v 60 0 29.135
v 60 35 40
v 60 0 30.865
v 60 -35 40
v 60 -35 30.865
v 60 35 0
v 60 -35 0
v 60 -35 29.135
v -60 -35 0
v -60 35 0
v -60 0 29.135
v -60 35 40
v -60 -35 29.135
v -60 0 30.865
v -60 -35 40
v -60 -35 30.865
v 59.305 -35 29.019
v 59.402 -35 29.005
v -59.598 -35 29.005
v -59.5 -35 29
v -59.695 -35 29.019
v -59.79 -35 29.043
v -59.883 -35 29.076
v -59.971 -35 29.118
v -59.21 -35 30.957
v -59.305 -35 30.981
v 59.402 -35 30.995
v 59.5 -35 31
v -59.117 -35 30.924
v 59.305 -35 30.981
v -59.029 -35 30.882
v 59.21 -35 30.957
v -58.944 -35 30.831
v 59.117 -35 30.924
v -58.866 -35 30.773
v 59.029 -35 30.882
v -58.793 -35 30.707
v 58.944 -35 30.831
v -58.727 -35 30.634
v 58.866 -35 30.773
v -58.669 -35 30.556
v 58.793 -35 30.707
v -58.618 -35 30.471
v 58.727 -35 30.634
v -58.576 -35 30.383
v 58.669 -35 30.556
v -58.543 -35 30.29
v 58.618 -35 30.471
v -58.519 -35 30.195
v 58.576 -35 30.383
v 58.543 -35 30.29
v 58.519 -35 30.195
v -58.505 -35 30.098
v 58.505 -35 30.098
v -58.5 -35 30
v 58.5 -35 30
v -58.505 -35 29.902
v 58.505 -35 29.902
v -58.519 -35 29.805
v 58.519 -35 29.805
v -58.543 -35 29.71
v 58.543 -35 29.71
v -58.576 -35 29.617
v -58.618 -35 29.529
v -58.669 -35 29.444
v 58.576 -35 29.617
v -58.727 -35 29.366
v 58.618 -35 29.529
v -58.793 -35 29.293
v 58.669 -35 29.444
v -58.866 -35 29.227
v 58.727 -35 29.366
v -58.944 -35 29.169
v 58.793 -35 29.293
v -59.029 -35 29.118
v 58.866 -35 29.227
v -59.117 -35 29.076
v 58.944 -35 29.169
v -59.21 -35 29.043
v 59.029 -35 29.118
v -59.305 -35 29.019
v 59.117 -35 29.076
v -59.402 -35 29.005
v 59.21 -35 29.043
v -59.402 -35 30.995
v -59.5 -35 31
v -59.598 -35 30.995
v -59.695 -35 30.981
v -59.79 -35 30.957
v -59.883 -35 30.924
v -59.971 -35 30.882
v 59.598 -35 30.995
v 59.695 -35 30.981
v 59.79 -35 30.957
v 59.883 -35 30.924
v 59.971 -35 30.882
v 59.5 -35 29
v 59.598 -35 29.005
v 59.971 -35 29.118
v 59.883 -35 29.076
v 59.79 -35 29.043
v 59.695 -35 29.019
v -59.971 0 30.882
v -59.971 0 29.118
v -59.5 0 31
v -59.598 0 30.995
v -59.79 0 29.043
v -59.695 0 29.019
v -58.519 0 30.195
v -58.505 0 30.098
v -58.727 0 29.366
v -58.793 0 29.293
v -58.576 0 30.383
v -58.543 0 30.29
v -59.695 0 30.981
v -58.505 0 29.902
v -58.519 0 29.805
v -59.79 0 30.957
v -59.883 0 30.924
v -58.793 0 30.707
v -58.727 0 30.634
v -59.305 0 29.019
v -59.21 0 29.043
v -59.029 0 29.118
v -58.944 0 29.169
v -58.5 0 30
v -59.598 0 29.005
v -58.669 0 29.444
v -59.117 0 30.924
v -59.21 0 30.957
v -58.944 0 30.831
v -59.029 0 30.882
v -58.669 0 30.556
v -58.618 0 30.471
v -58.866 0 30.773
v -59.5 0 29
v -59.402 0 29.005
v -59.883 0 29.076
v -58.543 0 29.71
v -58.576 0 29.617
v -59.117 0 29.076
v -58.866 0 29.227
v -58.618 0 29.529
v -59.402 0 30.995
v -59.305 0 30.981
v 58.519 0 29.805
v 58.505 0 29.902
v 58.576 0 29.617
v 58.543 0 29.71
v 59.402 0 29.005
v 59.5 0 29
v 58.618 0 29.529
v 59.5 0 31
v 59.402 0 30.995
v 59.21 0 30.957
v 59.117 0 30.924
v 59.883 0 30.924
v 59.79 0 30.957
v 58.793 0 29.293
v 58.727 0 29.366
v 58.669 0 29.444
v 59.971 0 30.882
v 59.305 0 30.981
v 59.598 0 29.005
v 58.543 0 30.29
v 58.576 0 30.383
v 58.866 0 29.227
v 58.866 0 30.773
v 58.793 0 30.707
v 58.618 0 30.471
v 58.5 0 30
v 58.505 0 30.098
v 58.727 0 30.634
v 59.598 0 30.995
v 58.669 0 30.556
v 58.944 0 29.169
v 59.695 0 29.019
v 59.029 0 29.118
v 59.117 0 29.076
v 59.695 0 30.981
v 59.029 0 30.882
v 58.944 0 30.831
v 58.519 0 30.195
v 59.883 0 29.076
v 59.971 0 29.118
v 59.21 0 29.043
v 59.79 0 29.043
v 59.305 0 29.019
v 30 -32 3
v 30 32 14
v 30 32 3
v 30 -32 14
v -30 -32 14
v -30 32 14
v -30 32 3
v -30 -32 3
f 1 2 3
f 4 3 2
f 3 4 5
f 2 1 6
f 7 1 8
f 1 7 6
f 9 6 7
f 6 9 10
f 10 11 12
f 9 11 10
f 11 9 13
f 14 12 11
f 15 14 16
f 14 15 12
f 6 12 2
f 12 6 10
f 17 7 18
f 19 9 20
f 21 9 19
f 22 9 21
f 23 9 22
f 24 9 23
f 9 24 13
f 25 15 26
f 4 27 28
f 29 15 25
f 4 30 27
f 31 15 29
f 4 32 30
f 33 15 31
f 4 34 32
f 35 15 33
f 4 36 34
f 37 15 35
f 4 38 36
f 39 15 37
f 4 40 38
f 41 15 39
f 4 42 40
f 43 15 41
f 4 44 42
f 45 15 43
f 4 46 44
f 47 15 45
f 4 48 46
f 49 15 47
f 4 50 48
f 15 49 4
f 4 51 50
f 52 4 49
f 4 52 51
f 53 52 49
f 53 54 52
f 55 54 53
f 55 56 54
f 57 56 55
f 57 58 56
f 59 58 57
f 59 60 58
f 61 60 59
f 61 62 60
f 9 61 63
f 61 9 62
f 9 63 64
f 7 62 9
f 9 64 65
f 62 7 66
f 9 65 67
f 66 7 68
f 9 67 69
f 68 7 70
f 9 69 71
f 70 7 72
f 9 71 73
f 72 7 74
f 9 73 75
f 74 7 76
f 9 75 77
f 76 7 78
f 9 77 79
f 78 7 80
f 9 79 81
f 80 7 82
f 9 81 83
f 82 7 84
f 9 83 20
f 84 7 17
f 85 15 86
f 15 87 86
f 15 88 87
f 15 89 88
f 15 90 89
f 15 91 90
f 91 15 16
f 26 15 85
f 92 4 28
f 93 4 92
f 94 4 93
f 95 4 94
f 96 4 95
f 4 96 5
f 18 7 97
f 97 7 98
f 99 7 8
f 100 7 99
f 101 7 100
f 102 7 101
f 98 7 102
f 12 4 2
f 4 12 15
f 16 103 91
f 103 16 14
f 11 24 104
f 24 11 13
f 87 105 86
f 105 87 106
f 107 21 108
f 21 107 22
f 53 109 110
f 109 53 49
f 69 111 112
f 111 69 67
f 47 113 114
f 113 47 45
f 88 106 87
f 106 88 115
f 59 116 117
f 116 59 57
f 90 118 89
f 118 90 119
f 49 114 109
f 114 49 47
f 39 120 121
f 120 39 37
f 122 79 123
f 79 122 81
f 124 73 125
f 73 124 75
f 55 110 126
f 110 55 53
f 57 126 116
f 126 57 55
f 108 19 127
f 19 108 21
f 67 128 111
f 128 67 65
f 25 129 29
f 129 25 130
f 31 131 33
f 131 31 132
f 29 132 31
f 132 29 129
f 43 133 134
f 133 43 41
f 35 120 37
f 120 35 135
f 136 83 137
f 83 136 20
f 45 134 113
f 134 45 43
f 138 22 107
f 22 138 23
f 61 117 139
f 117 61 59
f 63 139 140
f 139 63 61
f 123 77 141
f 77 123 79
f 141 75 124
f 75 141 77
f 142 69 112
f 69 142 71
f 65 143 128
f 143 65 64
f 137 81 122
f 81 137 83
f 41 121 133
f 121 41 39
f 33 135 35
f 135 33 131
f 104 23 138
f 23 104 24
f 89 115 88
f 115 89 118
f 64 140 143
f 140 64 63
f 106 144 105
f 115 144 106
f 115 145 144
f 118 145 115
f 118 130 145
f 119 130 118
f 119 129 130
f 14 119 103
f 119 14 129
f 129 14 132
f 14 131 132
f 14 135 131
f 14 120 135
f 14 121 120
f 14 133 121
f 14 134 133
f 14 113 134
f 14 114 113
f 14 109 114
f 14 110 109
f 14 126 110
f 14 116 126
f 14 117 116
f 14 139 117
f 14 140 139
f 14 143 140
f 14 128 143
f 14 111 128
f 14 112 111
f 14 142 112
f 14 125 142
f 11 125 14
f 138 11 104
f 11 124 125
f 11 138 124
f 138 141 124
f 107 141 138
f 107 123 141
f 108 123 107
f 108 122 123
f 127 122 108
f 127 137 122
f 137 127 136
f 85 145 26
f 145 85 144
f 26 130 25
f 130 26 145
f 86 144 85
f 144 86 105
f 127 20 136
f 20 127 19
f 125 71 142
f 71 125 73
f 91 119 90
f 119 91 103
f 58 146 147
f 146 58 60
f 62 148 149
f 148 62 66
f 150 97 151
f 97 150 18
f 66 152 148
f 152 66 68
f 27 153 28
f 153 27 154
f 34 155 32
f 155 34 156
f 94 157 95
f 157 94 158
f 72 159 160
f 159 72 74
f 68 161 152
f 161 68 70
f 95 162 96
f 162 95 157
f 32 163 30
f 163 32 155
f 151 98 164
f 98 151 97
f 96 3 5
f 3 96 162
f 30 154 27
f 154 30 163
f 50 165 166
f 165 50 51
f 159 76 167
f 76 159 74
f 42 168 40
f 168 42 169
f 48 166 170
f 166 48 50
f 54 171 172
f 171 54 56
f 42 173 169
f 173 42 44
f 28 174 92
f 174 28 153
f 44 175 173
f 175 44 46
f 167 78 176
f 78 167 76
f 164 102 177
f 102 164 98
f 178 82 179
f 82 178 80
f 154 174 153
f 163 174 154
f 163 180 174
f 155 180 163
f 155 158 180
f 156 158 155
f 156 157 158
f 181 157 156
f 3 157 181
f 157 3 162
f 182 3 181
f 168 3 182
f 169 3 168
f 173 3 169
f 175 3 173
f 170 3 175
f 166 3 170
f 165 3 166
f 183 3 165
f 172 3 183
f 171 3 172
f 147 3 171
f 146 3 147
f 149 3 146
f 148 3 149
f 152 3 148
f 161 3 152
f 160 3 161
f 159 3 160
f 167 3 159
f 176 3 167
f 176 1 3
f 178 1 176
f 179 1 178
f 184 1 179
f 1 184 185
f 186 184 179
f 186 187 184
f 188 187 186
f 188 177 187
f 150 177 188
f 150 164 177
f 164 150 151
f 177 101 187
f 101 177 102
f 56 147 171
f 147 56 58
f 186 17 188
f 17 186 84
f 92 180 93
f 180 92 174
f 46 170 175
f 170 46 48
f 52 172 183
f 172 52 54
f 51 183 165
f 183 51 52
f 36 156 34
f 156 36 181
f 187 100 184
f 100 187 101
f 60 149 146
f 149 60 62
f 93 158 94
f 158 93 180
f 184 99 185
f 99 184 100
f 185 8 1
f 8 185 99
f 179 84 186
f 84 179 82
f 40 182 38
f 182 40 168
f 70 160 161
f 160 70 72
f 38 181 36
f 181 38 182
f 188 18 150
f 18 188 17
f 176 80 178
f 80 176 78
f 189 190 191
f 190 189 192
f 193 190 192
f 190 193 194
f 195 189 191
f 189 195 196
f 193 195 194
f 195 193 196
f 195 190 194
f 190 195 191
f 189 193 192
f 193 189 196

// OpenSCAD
// Mini horizontal gel-electrophoresis box - buffer tank
// Print orientation: base on XY plane, open top facing +Z

// ---- Tank dimensions ----
outer_x = 120;   // outer length in X
outer_y = 70;    // outer width in Y
height  = 40;    // overall height in Z
wall    = 3;     // wall thickness
floor   = 3;     // floor thickness (bottom solid)

// ---- Platform dimensions ----
plat_len   = 60; // platform length in X (centred)
plat_w     = outer_y - 2*wall; // platform spans full inner width
plat_top_z = 13; // top of platform (inner floor + 10 mm)

// ---- Electrode holes ----
hole_d     = 2;  // hole diameter
hole_y     = 0;  // hole Y position
hole_z     = 30; // hole Z position
eps        = 0.5; // cutter overshoot past end walls

$fn = 64;

difference() {
    // Tank body
    union() {
        // Floor
        translate([-outer_x/2, -outer_y/2, 0])
            cube([outer_x, outer_y, floor]);
        // Walls (up to total height)
        translate([-outer_x/2, -outer_y/2, 0])
            cube([outer_x, outer_y, height]);
    }

    // Raised platform
    translate([-plat_len/2, -plat_w/2, floor])
        cube([plat_len, plat_w, plat_top_z - floor + 1]); // small overlap into floor

    // Electrode holes through end walls
    for (sx = [-1, 1])
        translate([sx * (outer_x/2 - eps), hole_y, hole_z])
            rotate([90, 0, 0])
                cylinder(d = hole_d, h = outer_x + 2*eps, $fn = 64);
}
